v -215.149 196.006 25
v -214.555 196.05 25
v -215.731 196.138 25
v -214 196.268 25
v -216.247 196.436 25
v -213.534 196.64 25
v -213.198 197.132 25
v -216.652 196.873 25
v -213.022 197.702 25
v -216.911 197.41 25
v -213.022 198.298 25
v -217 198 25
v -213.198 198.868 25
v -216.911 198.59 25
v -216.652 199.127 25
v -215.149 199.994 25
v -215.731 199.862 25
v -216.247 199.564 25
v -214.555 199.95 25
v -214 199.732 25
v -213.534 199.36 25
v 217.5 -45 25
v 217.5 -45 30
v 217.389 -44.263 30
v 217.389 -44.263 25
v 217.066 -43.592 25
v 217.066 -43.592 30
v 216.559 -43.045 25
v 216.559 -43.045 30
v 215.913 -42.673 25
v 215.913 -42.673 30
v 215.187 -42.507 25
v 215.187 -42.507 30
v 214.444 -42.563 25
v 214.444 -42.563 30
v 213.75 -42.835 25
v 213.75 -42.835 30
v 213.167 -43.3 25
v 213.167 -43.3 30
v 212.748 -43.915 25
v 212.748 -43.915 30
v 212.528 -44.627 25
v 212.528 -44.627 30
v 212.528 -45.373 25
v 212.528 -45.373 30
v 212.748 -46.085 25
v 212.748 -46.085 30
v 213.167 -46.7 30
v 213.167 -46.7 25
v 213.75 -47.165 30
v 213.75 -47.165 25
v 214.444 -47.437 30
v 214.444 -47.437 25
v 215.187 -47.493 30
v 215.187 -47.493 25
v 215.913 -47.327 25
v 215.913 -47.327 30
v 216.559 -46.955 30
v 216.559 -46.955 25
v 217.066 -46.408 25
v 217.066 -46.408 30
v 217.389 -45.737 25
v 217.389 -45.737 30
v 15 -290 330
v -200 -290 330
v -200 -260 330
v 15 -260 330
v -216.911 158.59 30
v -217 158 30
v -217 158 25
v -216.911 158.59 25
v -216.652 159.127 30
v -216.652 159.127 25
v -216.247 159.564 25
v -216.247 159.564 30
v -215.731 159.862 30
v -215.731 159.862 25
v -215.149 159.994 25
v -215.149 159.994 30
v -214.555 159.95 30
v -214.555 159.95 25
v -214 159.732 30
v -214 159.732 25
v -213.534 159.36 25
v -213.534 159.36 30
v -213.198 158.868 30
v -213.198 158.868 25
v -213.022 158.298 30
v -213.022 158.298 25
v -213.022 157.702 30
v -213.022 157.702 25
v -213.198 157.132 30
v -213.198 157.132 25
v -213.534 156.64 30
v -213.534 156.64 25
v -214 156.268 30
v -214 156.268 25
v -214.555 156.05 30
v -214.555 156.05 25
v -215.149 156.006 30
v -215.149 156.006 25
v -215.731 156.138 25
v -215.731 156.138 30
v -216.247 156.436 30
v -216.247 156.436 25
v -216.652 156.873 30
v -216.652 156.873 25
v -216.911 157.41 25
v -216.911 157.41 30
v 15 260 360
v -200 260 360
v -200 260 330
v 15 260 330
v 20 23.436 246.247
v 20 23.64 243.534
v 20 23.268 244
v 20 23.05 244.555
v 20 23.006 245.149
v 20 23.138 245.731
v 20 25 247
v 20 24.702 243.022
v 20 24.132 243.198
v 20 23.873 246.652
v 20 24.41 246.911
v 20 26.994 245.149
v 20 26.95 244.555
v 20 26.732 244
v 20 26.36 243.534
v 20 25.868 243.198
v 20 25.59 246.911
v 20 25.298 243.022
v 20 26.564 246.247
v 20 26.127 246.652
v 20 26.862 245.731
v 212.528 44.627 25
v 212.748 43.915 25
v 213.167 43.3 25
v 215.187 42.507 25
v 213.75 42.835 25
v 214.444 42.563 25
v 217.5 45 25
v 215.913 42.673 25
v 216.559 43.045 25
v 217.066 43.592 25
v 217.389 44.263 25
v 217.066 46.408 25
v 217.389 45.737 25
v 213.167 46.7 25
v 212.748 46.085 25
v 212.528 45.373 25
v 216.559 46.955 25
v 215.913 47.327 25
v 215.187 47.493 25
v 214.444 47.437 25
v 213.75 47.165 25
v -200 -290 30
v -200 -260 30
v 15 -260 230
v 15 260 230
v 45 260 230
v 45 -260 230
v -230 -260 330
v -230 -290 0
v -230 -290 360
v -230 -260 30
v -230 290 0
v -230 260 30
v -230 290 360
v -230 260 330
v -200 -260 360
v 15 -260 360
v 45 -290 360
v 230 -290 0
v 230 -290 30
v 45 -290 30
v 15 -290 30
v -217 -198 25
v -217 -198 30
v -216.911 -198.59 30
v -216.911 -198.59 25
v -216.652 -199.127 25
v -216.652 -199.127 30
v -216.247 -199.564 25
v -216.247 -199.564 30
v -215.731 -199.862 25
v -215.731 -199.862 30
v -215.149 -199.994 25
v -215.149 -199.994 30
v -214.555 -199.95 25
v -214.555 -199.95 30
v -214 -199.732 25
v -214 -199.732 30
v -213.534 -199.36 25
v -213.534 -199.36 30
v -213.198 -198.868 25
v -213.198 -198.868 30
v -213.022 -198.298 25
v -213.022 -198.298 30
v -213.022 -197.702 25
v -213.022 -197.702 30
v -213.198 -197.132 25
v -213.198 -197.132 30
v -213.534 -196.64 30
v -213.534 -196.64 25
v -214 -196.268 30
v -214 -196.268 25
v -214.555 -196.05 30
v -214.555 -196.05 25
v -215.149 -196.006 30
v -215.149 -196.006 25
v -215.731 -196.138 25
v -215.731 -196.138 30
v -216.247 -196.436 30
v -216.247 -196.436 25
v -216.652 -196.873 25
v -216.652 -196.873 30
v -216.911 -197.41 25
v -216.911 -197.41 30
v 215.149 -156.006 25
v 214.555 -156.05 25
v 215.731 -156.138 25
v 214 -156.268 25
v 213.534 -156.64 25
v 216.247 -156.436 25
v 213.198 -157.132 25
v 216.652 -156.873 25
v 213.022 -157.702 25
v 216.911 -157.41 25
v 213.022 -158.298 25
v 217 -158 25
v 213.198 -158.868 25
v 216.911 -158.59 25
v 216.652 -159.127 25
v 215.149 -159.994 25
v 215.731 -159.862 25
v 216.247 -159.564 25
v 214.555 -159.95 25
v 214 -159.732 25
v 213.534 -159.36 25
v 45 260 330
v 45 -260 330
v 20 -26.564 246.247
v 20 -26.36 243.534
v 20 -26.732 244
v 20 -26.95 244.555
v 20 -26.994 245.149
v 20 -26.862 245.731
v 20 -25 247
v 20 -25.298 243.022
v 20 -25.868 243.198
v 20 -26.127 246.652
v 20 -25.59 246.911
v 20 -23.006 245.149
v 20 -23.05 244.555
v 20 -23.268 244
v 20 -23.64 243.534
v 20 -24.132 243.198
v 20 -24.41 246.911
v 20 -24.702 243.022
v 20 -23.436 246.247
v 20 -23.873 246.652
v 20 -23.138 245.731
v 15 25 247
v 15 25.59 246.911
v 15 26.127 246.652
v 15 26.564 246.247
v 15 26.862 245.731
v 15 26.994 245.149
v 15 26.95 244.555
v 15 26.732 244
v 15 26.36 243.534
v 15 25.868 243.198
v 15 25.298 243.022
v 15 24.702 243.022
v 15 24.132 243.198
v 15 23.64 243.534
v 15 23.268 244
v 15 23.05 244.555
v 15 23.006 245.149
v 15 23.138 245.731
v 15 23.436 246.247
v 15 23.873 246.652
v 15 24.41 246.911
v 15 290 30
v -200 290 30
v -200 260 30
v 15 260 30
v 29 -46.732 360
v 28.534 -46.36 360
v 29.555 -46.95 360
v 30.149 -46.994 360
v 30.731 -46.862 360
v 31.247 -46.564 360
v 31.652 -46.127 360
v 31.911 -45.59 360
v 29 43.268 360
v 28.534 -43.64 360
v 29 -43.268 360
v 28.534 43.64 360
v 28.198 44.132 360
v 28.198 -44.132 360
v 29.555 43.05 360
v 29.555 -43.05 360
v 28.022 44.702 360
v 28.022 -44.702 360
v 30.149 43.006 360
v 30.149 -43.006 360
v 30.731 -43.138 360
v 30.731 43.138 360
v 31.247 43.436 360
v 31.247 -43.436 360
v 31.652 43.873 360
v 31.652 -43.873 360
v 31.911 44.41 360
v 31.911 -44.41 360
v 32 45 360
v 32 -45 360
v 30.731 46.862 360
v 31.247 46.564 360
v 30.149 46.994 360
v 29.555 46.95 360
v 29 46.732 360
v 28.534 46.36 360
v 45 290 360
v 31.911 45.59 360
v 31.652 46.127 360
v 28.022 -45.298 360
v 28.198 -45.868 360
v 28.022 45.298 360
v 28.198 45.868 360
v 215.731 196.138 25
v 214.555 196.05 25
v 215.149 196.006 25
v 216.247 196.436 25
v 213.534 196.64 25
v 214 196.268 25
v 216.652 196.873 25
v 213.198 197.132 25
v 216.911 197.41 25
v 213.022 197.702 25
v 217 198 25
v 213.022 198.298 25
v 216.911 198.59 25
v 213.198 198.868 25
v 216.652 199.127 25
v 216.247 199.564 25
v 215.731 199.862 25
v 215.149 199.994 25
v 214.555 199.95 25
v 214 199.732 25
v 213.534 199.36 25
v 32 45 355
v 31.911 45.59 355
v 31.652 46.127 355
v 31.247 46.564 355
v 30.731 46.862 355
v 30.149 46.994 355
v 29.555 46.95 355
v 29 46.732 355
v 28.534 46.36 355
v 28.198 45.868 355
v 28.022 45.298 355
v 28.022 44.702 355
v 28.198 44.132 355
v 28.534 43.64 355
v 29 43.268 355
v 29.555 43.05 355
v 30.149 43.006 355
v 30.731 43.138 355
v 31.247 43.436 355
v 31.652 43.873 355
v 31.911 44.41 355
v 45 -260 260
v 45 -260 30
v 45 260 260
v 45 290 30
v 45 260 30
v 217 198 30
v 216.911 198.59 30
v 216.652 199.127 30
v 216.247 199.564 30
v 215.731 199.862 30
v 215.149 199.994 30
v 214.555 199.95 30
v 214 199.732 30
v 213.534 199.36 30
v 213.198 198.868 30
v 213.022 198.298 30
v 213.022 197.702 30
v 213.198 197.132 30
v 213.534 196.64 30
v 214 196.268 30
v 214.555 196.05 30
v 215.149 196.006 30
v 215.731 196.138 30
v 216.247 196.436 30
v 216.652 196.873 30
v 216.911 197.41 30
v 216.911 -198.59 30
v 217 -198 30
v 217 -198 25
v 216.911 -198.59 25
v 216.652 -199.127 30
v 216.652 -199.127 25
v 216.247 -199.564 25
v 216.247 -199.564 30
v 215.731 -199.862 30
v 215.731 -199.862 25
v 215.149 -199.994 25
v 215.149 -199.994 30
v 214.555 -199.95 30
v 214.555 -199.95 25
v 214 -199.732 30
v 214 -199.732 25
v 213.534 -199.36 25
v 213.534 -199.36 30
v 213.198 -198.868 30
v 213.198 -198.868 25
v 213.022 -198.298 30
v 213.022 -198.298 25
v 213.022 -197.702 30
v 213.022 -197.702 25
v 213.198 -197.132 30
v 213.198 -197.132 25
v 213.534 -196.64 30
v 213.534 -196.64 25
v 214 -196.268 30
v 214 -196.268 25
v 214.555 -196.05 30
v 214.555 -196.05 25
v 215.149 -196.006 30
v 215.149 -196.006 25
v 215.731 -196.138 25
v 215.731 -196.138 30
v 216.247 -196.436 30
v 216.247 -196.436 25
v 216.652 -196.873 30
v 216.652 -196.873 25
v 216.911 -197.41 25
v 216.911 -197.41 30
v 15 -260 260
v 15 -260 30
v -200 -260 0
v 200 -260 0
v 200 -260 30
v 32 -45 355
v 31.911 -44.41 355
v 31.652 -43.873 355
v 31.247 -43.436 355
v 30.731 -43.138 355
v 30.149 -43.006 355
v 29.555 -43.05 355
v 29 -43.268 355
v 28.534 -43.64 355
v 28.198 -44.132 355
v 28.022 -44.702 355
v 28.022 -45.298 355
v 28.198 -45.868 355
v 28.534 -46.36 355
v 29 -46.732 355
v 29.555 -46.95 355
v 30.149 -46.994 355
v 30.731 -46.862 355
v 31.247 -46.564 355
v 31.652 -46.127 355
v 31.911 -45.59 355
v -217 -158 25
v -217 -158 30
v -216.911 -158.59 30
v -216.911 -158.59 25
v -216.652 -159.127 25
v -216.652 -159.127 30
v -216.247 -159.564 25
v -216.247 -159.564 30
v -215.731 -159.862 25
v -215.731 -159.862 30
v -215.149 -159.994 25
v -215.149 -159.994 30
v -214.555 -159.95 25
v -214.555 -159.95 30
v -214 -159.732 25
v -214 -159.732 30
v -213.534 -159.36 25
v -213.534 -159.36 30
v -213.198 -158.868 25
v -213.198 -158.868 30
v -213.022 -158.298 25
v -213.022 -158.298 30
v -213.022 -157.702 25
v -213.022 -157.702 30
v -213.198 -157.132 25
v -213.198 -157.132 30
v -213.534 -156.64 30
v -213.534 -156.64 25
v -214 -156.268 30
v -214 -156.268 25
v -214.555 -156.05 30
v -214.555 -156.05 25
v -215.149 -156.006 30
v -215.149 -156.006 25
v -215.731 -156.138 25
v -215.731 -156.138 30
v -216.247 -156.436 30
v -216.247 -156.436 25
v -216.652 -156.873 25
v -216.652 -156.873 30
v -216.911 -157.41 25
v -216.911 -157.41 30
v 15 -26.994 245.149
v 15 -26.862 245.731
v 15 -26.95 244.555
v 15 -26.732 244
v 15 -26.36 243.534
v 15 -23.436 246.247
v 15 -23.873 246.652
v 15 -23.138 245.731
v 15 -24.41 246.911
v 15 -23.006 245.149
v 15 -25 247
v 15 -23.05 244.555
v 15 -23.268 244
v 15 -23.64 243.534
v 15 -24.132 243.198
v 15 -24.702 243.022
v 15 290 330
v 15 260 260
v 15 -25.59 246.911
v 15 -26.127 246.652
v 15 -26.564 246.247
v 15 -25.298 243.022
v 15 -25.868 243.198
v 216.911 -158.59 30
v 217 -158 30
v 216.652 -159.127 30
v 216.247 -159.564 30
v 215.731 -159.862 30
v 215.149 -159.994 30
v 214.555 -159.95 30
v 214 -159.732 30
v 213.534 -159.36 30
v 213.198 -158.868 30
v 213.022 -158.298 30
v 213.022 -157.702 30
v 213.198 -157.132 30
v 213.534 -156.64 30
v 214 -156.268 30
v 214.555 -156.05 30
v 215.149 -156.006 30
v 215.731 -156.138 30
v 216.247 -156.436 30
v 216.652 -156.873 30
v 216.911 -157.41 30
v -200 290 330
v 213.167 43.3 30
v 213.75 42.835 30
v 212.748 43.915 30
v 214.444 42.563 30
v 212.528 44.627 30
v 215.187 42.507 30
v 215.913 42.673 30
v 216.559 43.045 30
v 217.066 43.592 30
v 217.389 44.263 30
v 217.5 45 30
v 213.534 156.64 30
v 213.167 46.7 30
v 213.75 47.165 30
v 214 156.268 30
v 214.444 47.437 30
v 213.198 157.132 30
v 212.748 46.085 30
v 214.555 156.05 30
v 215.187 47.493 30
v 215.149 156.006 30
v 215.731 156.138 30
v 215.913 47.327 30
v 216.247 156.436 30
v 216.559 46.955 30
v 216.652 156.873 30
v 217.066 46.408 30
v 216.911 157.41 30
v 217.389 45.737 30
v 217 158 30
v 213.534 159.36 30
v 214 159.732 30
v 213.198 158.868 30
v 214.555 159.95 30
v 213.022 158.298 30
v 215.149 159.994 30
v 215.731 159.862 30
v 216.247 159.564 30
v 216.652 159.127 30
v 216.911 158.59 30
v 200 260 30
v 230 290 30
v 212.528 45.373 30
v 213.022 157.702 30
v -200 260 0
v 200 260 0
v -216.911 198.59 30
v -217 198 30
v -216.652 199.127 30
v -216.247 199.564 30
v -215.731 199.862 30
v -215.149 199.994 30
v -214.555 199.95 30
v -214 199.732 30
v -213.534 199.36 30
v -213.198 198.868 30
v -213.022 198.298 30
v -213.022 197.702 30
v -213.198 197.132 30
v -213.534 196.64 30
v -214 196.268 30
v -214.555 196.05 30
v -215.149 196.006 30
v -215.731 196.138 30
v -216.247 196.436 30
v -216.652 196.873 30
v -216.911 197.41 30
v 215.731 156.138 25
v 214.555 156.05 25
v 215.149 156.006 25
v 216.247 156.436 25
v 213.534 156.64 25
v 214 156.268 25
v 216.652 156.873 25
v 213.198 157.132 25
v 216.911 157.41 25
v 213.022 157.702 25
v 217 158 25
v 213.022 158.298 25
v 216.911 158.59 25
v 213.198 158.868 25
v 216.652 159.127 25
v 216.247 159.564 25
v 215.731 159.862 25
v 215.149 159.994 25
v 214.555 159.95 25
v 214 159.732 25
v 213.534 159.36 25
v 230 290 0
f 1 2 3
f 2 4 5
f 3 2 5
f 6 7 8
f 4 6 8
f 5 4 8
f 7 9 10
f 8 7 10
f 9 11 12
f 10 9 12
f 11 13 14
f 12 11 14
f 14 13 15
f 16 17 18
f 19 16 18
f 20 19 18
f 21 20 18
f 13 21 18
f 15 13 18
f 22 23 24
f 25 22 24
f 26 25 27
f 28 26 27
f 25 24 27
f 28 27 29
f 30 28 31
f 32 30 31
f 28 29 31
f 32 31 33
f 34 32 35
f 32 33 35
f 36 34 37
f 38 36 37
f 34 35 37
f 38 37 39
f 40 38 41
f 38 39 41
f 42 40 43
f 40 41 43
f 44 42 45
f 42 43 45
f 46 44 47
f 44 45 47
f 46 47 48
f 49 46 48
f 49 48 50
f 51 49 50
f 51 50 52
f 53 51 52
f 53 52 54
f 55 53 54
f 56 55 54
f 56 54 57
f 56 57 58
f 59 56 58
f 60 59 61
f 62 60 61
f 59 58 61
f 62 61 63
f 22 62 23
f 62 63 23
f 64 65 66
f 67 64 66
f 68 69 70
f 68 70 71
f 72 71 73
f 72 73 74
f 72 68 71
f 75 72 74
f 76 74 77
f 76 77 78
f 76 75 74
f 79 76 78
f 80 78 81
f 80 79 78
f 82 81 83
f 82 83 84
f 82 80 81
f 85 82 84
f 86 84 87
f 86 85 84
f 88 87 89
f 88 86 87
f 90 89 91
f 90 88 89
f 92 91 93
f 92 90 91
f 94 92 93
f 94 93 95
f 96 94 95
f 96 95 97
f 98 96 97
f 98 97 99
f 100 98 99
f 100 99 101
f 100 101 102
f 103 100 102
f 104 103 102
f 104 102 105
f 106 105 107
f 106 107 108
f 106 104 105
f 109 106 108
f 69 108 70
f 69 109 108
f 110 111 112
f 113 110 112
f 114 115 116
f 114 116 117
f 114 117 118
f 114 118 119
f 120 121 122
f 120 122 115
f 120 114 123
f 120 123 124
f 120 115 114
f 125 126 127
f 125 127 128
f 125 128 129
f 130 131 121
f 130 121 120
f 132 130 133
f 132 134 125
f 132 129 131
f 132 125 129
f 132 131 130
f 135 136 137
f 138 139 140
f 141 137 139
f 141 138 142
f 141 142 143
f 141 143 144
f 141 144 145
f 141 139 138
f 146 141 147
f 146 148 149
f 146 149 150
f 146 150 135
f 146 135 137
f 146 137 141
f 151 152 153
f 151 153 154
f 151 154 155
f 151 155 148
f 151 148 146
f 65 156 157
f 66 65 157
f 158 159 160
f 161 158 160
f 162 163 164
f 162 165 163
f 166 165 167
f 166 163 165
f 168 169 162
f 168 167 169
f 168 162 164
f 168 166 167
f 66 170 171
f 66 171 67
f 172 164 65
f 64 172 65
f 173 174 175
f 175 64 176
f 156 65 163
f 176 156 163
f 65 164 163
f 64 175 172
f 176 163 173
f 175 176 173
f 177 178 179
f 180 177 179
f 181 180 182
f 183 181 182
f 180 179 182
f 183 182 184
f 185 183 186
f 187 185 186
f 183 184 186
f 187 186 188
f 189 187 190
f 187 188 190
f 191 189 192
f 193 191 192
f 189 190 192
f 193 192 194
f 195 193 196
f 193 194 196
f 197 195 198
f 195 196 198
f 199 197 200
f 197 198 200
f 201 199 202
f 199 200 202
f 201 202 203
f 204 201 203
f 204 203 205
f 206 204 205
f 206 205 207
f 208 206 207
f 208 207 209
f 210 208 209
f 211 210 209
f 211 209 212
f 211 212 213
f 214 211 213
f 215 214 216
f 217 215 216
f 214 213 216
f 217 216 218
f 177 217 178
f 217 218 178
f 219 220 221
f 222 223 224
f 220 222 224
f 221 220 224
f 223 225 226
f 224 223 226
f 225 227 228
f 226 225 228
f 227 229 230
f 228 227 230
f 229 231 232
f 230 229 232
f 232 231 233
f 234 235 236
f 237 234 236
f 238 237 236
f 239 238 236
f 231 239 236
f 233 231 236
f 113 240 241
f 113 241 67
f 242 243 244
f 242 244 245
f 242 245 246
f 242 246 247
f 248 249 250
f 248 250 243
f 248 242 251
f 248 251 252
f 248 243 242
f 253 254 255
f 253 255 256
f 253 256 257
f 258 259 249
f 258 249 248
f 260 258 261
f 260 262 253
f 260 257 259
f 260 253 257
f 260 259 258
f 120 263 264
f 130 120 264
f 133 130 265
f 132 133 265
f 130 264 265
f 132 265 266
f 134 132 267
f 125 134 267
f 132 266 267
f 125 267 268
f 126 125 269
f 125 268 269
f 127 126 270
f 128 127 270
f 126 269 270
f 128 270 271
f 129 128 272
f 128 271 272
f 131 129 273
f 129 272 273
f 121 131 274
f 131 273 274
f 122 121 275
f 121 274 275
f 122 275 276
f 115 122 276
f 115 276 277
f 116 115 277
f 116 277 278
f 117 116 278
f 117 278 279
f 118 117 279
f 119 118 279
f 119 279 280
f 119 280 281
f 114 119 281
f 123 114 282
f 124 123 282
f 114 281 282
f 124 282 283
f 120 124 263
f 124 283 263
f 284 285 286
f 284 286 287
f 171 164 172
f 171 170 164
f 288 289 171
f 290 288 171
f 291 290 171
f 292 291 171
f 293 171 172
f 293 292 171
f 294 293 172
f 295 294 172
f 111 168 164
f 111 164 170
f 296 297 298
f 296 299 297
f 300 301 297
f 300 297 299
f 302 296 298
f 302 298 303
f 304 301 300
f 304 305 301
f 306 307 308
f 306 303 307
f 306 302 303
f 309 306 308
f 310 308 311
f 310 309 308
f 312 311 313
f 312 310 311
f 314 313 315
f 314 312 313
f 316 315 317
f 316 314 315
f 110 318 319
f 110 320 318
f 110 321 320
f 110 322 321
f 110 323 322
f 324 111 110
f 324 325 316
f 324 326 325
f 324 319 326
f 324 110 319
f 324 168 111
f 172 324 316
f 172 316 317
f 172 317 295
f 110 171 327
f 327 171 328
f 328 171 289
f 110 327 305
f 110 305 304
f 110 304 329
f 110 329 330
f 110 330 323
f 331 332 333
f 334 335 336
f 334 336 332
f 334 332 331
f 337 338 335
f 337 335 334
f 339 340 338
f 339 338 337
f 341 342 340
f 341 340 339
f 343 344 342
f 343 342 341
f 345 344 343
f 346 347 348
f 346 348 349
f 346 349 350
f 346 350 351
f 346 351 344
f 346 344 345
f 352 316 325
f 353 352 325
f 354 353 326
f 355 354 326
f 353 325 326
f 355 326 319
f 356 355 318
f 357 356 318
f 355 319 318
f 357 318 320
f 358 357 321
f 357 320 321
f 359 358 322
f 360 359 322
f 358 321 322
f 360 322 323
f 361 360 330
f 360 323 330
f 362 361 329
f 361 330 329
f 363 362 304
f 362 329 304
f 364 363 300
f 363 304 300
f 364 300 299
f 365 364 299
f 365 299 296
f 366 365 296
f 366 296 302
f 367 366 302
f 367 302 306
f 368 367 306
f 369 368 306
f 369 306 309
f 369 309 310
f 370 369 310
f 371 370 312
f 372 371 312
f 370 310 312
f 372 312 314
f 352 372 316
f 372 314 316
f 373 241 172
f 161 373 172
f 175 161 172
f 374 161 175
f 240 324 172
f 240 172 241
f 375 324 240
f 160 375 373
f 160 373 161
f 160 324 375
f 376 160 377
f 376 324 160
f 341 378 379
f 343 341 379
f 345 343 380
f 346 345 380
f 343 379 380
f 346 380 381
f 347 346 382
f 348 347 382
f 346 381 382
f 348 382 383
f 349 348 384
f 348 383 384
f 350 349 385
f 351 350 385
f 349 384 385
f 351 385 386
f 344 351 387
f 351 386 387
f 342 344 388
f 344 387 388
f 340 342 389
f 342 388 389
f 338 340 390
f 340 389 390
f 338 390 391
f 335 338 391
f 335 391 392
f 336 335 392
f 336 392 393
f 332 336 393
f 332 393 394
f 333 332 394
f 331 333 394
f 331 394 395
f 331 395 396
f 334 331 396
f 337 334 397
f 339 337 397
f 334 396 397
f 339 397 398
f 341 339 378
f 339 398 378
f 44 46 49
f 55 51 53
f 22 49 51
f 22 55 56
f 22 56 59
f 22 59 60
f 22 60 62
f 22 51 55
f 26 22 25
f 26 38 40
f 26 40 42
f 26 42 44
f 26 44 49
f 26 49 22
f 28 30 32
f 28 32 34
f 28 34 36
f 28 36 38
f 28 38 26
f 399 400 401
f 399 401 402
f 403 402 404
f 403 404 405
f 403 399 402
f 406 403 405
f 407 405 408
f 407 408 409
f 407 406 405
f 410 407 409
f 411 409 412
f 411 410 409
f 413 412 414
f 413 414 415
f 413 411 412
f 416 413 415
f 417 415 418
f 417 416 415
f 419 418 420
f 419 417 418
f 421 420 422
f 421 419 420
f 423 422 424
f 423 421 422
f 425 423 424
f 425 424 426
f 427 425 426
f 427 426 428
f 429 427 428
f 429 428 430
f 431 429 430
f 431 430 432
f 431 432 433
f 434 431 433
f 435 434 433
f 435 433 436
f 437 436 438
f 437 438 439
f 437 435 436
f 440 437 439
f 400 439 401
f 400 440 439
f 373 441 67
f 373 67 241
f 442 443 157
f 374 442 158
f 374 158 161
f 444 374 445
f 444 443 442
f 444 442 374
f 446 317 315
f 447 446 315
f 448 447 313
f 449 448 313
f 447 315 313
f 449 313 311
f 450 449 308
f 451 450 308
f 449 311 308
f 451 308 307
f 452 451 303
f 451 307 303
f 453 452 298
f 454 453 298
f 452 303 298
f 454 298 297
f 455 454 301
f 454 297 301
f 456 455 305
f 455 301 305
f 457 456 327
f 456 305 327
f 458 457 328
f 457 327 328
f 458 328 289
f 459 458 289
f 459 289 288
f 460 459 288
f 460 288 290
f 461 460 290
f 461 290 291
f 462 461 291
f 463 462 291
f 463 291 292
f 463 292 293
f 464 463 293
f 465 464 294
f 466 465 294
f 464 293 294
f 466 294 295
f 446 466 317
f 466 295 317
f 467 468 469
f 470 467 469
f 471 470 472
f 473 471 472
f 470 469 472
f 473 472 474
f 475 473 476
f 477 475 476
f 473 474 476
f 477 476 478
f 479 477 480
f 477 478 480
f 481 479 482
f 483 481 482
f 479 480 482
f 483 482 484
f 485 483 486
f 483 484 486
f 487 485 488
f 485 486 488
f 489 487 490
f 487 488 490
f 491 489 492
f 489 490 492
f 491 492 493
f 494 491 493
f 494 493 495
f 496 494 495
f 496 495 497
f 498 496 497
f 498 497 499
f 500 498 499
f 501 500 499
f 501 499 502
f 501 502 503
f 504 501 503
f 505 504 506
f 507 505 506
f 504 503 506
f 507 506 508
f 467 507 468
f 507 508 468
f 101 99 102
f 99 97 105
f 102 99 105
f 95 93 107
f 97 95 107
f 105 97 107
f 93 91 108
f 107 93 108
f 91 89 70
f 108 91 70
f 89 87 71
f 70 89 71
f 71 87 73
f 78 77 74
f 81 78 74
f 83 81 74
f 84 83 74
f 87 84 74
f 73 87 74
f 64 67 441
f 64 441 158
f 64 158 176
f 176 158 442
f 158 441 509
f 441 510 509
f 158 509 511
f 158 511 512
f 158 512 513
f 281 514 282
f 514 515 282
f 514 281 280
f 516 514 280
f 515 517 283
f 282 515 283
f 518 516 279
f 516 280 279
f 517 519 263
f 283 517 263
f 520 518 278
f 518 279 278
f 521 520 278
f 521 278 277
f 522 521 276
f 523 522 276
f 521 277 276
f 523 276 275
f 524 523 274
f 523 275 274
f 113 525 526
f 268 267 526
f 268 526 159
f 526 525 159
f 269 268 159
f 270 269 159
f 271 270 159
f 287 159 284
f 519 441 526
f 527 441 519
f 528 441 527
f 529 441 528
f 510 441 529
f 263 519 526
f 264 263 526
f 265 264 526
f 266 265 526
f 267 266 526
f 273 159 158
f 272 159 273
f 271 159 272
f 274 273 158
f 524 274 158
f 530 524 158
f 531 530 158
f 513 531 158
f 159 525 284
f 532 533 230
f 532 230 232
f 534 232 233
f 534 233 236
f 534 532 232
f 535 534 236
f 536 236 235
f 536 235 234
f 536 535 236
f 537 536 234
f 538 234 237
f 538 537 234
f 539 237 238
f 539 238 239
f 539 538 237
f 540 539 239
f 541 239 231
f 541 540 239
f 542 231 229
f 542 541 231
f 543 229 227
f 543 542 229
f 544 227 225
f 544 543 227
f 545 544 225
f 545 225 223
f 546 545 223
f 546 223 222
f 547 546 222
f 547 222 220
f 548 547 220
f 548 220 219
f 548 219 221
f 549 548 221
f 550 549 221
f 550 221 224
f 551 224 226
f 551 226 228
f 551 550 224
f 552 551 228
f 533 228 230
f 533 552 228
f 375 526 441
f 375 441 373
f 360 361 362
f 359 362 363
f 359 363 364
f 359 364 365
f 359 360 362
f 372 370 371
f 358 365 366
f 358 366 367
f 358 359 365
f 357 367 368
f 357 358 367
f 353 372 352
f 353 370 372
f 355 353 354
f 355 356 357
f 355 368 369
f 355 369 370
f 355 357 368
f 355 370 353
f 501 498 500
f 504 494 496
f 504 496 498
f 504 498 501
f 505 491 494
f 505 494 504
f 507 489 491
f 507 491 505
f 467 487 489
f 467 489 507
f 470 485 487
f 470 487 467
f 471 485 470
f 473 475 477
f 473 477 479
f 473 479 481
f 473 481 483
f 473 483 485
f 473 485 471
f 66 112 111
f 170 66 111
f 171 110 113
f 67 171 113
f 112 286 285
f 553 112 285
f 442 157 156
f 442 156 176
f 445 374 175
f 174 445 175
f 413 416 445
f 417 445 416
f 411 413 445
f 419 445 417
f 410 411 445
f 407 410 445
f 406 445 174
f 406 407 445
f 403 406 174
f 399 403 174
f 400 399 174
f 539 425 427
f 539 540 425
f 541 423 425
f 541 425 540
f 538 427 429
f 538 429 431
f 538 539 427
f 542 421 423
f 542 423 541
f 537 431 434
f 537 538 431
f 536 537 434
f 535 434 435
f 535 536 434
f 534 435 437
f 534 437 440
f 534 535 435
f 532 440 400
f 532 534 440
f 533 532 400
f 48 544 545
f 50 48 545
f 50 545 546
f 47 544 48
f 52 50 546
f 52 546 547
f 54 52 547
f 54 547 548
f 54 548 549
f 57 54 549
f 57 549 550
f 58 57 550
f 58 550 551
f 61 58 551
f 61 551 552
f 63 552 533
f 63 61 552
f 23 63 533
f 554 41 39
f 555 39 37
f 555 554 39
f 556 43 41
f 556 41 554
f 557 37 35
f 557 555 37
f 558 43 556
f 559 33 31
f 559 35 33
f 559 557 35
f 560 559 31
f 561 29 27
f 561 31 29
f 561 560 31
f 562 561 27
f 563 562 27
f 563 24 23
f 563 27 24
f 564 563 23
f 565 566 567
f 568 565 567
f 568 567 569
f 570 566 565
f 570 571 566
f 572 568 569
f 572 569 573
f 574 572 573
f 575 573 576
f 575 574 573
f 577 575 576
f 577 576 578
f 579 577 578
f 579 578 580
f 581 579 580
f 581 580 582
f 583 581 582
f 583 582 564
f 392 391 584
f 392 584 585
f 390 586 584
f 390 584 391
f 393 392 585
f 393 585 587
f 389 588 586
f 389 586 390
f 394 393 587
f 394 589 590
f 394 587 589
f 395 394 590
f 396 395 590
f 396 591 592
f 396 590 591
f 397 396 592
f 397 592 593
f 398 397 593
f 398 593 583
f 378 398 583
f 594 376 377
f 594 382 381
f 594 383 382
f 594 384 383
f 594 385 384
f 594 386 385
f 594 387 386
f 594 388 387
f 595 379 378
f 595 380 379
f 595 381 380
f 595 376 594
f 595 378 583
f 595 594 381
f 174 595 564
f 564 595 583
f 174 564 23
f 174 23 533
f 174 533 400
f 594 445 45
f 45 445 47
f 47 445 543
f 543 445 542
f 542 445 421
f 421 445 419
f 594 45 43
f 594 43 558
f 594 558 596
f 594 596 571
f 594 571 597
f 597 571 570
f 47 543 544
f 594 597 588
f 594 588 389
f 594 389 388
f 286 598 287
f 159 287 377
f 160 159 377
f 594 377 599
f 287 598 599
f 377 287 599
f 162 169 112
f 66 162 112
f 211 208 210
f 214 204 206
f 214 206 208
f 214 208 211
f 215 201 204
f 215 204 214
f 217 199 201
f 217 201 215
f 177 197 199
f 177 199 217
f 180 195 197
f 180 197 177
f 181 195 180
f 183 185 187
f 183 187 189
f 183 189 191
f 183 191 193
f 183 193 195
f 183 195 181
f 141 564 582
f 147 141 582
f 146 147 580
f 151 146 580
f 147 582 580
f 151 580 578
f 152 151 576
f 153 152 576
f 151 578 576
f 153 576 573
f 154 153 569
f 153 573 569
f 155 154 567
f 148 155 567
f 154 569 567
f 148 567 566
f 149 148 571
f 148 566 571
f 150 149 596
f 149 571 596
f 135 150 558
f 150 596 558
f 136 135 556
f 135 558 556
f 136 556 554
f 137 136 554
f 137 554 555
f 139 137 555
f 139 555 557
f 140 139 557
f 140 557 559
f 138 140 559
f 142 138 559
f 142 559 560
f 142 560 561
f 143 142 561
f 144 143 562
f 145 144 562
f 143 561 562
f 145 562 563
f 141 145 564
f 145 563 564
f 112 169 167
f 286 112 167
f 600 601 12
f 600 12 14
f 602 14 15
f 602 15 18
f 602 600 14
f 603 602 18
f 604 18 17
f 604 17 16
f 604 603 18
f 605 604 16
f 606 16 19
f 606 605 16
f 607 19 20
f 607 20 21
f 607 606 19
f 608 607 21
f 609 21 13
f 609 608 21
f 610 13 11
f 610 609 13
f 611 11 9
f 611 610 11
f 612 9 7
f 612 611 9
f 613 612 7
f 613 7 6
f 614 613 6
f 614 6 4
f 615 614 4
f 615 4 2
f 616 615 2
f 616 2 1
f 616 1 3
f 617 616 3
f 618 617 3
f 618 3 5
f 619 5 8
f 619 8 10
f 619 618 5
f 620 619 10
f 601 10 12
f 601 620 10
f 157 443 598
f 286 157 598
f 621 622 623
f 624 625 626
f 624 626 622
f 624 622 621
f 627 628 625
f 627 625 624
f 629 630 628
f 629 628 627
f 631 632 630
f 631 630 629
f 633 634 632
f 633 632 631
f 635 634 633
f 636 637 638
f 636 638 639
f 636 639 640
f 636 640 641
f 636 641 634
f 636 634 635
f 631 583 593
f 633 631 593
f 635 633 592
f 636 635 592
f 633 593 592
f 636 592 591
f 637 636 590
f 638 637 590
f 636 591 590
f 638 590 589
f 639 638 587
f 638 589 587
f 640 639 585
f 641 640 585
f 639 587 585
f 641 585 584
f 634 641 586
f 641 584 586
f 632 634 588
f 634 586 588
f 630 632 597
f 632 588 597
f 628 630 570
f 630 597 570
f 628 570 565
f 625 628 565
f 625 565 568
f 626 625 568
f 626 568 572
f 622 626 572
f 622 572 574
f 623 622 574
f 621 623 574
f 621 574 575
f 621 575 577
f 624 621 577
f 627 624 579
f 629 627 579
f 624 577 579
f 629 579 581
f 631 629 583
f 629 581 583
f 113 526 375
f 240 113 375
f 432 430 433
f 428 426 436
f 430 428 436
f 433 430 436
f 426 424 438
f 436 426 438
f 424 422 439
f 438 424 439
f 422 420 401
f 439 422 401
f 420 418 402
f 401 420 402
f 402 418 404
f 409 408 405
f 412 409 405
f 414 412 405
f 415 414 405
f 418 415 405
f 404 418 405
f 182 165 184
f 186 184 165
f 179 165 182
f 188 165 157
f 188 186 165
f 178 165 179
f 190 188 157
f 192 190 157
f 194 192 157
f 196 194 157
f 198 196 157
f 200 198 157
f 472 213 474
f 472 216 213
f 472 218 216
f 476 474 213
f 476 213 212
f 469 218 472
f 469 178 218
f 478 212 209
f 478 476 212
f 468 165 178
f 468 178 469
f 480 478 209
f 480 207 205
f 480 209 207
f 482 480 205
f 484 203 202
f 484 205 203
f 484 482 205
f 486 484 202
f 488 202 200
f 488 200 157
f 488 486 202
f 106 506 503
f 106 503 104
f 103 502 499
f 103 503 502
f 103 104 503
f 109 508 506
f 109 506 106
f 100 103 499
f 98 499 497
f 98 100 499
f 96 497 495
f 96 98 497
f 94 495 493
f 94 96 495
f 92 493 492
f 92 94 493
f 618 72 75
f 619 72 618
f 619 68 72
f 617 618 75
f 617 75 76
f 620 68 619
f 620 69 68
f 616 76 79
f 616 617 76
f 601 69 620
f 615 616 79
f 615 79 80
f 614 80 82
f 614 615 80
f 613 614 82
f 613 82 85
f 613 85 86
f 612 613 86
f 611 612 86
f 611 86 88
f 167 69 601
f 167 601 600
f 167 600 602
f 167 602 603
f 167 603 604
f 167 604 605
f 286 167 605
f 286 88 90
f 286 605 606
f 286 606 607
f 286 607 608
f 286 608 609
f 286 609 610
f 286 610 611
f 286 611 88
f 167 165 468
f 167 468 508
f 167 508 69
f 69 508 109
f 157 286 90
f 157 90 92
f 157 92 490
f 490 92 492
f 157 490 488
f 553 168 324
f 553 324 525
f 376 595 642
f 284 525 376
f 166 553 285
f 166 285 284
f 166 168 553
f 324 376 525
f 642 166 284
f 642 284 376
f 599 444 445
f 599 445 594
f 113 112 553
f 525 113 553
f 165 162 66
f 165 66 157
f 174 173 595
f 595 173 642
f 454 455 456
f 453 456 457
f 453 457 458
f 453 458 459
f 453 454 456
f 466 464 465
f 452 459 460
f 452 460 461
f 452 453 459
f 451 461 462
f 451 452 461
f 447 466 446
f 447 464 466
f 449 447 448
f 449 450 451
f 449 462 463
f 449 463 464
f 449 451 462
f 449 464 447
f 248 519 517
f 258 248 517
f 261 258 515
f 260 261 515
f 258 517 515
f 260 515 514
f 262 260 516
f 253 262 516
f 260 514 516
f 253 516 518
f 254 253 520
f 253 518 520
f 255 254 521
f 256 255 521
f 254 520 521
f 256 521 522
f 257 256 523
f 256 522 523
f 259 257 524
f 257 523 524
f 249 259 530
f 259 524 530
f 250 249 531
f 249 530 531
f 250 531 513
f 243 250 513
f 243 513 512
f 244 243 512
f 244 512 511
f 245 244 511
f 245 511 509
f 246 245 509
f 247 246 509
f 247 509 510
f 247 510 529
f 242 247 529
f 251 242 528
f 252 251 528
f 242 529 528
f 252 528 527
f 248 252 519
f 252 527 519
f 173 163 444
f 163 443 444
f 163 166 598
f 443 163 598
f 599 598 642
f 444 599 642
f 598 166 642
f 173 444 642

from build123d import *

# Parameters (mm, degrees)
SZKIC1_W                    = 460
SZKIC1_H                    = 580
SZKIC1_W_2                  = 400
SZKIC1_H_2                  = 520
DODANIE_WYCI_GNI_CIE1_DEPTH = 30
SZKIC4_R                    = 2.5
WYTNIJ_WYCI_GNI_CIE2_DEPTH  = 5
SZKIC5_W                    = 30
SZKIC5_H                    = 30
DODANIE_WYCI_GNI_CIE3_DEPTH = 330
DODANIE_WYCI_GNI_CIE4_REACH = 698.419
SZKIC6_W                    = 30
SZKIC6_H                    = 30
DODANIE_WYCI_GNI_CIE5_REACH = 698.419
SZKIC7_W                    = 30
SZKIC7_H                    = 30
SZKIC8_W                    = 30
SZKIC8_H                    = 30
DODANIE_WYCI_GNI_CIE6_DEPTH = 330
DODANIE_WYCI_GNI_CIE7_REACH = 633.348
SZKIC9_W                    = 30
SZKIC9_H                    = 30
DODANIE_WYCI_GNI_CIE8_REACH = 698.419
SZKIC10_W                   = 30
SZKIC10_H                   = 30
SZKIC11_R                   = 2
WYTNIJ_WYCI_GNI_CIE3_DEPTH  = 5
SZKIC12_R                   = 2
WYTNIJ_WYCI_GNI_CIE4_DEPTH  = 5
SZKIC2_R                    = 2
WYTNIJ_WYCI_GNI_CIE5_DEPTH  = 5
LUSTRO2_COPY_1_SKETCH_R     = 2
LUSTRO2_COPY_1_DEPTH        = 5


with BuildPart() as part:
    # Szkic1 → Dodanie-wyciągnięcie1 (new body)
    with BuildSketch(Plane.XY):
        Rectangle(SZKIC1_W, SZKIC1_H)
        Rectangle(SZKIC1_W_2, SZKIC1_H_2, mode=Mode.SUBTRACT)
    extrude(amount=DODANIE_WYCI_GNI_CIE1_DEPTH)

    # Szkic4 → Wytnij-wyciągnięcie2 (cut)
    with BuildSketch(Plane.XY.offset(30)):
        with Locations((215, 45)):
            Circle(SZKIC4_R)
        with Locations((215, -45)):
            Circle(SZKIC4_R)
    extrude(amount=-WYTNIJ_WYCI_GNI_CIE2_DEPTH, mode=Mode.SUBTRACT)

    # Szkic5 → Dodanie-wyciągnięcie3 (add)
    with BuildSketch(Plane.XY.offset(30)):
        with Locations((30, -275)):
            Rectangle(SZKIC5_W, SZKIC5_H)
        with Locations((30, 275)):
            Rectangle(SZKIC5_W, SZKIC5_H)
    extrude(amount=DODANIE_WYCI_GNI_CIE3_DEPTH)

    # Szkic6 → Dodanie-wyciągnięcie4 (add, up to next)
    with BuildSketch(Plane.XZ.offset(-260), mode=Mode.PRIVATE) as dodanie_wyci_gni_cie4_sk1:
        with Locations((30, 245)):
            Rectangle(SZKIC6_W, SZKIC6_H)
    dodanie_wyci_gni_cie4_tool1 = extrude(dodanie_wyci_gni_cie4_sk1.sketch, amount=DODANIE_WYCI_GNI_CIE4_REACH, mode=Mode.PRIVATE) - part.part
    add(dodanie_wyci_gni_cie4_tool1.solids().sort_by_distance((30, 260, 245))[0])

    # Szkic7 → Dodanie-wyciągnięcie5 (add, up to next)
    with BuildSketch(Plane(origin=(0, 260, 0), x_dir=(-1, 0, 0), z_dir=(0, -1, 0)), mode=Mode.PRIVATE) as dodanie_wyci_gni_cie5_sk1:
        with Locations((-30, -345)):
            Rectangle(SZKIC7_W, SZKIC7_H)
    dodanie_wyci_gni_cie5_tool1 = extrude(dodanie_wyci_gni_cie5_sk1.sketch, amount=DODANIE_WYCI_GNI_CIE5_REACH, mode=Mode.PRIVATE) - part.part
    add(dodanie_wyci_gni_cie5_tool1.solids().sort_by_distance((30, 260, 345))[0])

    # Szkic8 → Dodanie-wyciągnięcie6 (add)
    with BuildSketch(Plane.XY.offset(30)):
        with Locations((-215, 275)):
            Rectangle(SZKIC8_W, SZKIC8_H)
        with Locations((-215, -275)):
            Rectangle(SZKIC8_W, SZKIC8_H)
    extrude(amount=DODANIE_WYCI_GNI_CIE6_DEPTH)

    # Szkic9 → Dodanie-wyciągnięcie7 (add, up to next)
    with BuildSketch(Plane(origin=(-200, 0, 0), x_dir=(0, 0, -1), z_dir=(1, 0, 0)), mode=Mode.PRIVATE) as dodanie_wyci_gni_cie7_sk1:
        with Locations((-345, 275)):
            Rectangle(SZKIC9_W, SZKIC9_H)
    dodanie_wyci_gni_cie7_tool1 = extrude(dodanie_wyci_gni_cie7_sk1.sketch, amount=DODANIE_WYCI_GNI_CIE7_REACH, mode=Mode.PRIVATE) - part.part
    # Szkic9 → Dodanie-wyciągnięcie7 (add, up to next)
    with BuildSketch(Plane(origin=(-200, 0, 0), x_dir=(0, 0, -1), z_dir=(1, 0, 0)), mode=Mode.PRIVATE) as dodanie_wyci_gni_cie7_sk2:
        with Locations((-345, -275)):
            Rectangle(SZKIC9_W, SZKIC9_H)
    dodanie_wyci_gni_cie7_tool2 = extrude(dodanie_wyci_gni_cie7_sk2.sketch, amount=DODANIE_WYCI_GNI_CIE7_REACH, mode=Mode.PRIVATE) - part.part
    add(dodanie_wyci_gni_cie7_tool1.solids().sort_by_distance((-200, 275, 345))[0])
    add(dodanie_wyci_gni_cie7_tool2.solids().sort_by_distance((-200, -275, 345))[0])

    # Szkic10 → Dodanie-wyciągnięcie8 (add, up to next)
    with BuildSketch(Plane.XZ.offset(-260), mode=Mode.PRIVATE) as dodanie_wyci_gni_cie8_sk1:
        with Locations((-215, 345)):
            Rectangle(SZKIC10_W, SZKIC10_H)
    dodanie_wyci_gni_cie8_tool1 = extrude(dodanie_wyci_gni_cie8_sk1.sketch, amount=DODANIE_WYCI_GNI_CIE8_REACH, mode=Mode.PRIVATE) - part.part
    add(dodanie_wyci_gni_cie8_tool1.solids().sort_by_distance((-215, 260, 345))[0])

    # Szkic11 → Wytnij-wyciągnięcie3 (cut)
    with BuildSketch(Plane.ZY.offset(-15)):
        with Locations((245, 25)):
            Circle(SZKIC11_R)
        with Locations((245, -25)):
            Circle(SZKIC11_R)
    extrude(amount=-WYTNIJ_WYCI_GNI_CIE3_DEPTH, mode=Mode.SUBTRACT)

    # Szkic12 → Wytnij-wyciągnięcie4 (cut)
    with BuildSketch(Plane.XY.offset(360)):
        with Locations((30, -45)):
            Circle(SZKIC12_R)
        with Locations((30, 45)):
            Circle(SZKIC12_R)
    extrude(amount=-WYTNIJ_WYCI_GNI_CIE4_DEPTH, mode=Mode.SUBTRACT)

    # Szkic2 → Wytnij-wyciągnięcie5 (cut)
    with BuildSketch(Plane.XY.offset(30)):
        with Locations((215, 198)):
            Circle(SZKIC2_R)
        with Locations((215, 158)):
            Circle(SZKIC2_R)
    wytnij_wyci_gni_cie5 = extrude(amount=-WYTNIJ_WYCI_GNI_CIE5_DEPTH, mode=Mode.SUBTRACT)

    # Lustro1: Wytnij-wyciągnięcie5 across plane
    add(wytnij_wyci_gni_cie5.mirror(Plane(origin=(0, 0, 0), x_dir=(0, 0, 1), z_dir=(1, 0, 0))), mode=Mode.SUBTRACT)

    # Lustro2: Wytnij-wyciągnięcie5 across plane
    add(wytnij_wyci_gni_cie5.mirror(Plane.ZX), mode=Mode.SUBTRACT)

    # Lustro2 copy 1 sketch → Lustro2 copy 1 (cut)
    with BuildSketch(Plane(origin=(0, 0, 30), x_dir=(-1, 0, 0), z_dir=(0, 0, 1))):
        with Locations((215, 198)):
            Circle(LUSTRO2_COPY_1_SKETCH_R)
        with Locations((215, 158)):
            Circle(LUSTRO2_COPY_1_SKETCH_R)
    extrude(amount=-LUSTRO2_COPY_1_DEPTH, mode=Mode.SUBTRACT)


solid = part.part
